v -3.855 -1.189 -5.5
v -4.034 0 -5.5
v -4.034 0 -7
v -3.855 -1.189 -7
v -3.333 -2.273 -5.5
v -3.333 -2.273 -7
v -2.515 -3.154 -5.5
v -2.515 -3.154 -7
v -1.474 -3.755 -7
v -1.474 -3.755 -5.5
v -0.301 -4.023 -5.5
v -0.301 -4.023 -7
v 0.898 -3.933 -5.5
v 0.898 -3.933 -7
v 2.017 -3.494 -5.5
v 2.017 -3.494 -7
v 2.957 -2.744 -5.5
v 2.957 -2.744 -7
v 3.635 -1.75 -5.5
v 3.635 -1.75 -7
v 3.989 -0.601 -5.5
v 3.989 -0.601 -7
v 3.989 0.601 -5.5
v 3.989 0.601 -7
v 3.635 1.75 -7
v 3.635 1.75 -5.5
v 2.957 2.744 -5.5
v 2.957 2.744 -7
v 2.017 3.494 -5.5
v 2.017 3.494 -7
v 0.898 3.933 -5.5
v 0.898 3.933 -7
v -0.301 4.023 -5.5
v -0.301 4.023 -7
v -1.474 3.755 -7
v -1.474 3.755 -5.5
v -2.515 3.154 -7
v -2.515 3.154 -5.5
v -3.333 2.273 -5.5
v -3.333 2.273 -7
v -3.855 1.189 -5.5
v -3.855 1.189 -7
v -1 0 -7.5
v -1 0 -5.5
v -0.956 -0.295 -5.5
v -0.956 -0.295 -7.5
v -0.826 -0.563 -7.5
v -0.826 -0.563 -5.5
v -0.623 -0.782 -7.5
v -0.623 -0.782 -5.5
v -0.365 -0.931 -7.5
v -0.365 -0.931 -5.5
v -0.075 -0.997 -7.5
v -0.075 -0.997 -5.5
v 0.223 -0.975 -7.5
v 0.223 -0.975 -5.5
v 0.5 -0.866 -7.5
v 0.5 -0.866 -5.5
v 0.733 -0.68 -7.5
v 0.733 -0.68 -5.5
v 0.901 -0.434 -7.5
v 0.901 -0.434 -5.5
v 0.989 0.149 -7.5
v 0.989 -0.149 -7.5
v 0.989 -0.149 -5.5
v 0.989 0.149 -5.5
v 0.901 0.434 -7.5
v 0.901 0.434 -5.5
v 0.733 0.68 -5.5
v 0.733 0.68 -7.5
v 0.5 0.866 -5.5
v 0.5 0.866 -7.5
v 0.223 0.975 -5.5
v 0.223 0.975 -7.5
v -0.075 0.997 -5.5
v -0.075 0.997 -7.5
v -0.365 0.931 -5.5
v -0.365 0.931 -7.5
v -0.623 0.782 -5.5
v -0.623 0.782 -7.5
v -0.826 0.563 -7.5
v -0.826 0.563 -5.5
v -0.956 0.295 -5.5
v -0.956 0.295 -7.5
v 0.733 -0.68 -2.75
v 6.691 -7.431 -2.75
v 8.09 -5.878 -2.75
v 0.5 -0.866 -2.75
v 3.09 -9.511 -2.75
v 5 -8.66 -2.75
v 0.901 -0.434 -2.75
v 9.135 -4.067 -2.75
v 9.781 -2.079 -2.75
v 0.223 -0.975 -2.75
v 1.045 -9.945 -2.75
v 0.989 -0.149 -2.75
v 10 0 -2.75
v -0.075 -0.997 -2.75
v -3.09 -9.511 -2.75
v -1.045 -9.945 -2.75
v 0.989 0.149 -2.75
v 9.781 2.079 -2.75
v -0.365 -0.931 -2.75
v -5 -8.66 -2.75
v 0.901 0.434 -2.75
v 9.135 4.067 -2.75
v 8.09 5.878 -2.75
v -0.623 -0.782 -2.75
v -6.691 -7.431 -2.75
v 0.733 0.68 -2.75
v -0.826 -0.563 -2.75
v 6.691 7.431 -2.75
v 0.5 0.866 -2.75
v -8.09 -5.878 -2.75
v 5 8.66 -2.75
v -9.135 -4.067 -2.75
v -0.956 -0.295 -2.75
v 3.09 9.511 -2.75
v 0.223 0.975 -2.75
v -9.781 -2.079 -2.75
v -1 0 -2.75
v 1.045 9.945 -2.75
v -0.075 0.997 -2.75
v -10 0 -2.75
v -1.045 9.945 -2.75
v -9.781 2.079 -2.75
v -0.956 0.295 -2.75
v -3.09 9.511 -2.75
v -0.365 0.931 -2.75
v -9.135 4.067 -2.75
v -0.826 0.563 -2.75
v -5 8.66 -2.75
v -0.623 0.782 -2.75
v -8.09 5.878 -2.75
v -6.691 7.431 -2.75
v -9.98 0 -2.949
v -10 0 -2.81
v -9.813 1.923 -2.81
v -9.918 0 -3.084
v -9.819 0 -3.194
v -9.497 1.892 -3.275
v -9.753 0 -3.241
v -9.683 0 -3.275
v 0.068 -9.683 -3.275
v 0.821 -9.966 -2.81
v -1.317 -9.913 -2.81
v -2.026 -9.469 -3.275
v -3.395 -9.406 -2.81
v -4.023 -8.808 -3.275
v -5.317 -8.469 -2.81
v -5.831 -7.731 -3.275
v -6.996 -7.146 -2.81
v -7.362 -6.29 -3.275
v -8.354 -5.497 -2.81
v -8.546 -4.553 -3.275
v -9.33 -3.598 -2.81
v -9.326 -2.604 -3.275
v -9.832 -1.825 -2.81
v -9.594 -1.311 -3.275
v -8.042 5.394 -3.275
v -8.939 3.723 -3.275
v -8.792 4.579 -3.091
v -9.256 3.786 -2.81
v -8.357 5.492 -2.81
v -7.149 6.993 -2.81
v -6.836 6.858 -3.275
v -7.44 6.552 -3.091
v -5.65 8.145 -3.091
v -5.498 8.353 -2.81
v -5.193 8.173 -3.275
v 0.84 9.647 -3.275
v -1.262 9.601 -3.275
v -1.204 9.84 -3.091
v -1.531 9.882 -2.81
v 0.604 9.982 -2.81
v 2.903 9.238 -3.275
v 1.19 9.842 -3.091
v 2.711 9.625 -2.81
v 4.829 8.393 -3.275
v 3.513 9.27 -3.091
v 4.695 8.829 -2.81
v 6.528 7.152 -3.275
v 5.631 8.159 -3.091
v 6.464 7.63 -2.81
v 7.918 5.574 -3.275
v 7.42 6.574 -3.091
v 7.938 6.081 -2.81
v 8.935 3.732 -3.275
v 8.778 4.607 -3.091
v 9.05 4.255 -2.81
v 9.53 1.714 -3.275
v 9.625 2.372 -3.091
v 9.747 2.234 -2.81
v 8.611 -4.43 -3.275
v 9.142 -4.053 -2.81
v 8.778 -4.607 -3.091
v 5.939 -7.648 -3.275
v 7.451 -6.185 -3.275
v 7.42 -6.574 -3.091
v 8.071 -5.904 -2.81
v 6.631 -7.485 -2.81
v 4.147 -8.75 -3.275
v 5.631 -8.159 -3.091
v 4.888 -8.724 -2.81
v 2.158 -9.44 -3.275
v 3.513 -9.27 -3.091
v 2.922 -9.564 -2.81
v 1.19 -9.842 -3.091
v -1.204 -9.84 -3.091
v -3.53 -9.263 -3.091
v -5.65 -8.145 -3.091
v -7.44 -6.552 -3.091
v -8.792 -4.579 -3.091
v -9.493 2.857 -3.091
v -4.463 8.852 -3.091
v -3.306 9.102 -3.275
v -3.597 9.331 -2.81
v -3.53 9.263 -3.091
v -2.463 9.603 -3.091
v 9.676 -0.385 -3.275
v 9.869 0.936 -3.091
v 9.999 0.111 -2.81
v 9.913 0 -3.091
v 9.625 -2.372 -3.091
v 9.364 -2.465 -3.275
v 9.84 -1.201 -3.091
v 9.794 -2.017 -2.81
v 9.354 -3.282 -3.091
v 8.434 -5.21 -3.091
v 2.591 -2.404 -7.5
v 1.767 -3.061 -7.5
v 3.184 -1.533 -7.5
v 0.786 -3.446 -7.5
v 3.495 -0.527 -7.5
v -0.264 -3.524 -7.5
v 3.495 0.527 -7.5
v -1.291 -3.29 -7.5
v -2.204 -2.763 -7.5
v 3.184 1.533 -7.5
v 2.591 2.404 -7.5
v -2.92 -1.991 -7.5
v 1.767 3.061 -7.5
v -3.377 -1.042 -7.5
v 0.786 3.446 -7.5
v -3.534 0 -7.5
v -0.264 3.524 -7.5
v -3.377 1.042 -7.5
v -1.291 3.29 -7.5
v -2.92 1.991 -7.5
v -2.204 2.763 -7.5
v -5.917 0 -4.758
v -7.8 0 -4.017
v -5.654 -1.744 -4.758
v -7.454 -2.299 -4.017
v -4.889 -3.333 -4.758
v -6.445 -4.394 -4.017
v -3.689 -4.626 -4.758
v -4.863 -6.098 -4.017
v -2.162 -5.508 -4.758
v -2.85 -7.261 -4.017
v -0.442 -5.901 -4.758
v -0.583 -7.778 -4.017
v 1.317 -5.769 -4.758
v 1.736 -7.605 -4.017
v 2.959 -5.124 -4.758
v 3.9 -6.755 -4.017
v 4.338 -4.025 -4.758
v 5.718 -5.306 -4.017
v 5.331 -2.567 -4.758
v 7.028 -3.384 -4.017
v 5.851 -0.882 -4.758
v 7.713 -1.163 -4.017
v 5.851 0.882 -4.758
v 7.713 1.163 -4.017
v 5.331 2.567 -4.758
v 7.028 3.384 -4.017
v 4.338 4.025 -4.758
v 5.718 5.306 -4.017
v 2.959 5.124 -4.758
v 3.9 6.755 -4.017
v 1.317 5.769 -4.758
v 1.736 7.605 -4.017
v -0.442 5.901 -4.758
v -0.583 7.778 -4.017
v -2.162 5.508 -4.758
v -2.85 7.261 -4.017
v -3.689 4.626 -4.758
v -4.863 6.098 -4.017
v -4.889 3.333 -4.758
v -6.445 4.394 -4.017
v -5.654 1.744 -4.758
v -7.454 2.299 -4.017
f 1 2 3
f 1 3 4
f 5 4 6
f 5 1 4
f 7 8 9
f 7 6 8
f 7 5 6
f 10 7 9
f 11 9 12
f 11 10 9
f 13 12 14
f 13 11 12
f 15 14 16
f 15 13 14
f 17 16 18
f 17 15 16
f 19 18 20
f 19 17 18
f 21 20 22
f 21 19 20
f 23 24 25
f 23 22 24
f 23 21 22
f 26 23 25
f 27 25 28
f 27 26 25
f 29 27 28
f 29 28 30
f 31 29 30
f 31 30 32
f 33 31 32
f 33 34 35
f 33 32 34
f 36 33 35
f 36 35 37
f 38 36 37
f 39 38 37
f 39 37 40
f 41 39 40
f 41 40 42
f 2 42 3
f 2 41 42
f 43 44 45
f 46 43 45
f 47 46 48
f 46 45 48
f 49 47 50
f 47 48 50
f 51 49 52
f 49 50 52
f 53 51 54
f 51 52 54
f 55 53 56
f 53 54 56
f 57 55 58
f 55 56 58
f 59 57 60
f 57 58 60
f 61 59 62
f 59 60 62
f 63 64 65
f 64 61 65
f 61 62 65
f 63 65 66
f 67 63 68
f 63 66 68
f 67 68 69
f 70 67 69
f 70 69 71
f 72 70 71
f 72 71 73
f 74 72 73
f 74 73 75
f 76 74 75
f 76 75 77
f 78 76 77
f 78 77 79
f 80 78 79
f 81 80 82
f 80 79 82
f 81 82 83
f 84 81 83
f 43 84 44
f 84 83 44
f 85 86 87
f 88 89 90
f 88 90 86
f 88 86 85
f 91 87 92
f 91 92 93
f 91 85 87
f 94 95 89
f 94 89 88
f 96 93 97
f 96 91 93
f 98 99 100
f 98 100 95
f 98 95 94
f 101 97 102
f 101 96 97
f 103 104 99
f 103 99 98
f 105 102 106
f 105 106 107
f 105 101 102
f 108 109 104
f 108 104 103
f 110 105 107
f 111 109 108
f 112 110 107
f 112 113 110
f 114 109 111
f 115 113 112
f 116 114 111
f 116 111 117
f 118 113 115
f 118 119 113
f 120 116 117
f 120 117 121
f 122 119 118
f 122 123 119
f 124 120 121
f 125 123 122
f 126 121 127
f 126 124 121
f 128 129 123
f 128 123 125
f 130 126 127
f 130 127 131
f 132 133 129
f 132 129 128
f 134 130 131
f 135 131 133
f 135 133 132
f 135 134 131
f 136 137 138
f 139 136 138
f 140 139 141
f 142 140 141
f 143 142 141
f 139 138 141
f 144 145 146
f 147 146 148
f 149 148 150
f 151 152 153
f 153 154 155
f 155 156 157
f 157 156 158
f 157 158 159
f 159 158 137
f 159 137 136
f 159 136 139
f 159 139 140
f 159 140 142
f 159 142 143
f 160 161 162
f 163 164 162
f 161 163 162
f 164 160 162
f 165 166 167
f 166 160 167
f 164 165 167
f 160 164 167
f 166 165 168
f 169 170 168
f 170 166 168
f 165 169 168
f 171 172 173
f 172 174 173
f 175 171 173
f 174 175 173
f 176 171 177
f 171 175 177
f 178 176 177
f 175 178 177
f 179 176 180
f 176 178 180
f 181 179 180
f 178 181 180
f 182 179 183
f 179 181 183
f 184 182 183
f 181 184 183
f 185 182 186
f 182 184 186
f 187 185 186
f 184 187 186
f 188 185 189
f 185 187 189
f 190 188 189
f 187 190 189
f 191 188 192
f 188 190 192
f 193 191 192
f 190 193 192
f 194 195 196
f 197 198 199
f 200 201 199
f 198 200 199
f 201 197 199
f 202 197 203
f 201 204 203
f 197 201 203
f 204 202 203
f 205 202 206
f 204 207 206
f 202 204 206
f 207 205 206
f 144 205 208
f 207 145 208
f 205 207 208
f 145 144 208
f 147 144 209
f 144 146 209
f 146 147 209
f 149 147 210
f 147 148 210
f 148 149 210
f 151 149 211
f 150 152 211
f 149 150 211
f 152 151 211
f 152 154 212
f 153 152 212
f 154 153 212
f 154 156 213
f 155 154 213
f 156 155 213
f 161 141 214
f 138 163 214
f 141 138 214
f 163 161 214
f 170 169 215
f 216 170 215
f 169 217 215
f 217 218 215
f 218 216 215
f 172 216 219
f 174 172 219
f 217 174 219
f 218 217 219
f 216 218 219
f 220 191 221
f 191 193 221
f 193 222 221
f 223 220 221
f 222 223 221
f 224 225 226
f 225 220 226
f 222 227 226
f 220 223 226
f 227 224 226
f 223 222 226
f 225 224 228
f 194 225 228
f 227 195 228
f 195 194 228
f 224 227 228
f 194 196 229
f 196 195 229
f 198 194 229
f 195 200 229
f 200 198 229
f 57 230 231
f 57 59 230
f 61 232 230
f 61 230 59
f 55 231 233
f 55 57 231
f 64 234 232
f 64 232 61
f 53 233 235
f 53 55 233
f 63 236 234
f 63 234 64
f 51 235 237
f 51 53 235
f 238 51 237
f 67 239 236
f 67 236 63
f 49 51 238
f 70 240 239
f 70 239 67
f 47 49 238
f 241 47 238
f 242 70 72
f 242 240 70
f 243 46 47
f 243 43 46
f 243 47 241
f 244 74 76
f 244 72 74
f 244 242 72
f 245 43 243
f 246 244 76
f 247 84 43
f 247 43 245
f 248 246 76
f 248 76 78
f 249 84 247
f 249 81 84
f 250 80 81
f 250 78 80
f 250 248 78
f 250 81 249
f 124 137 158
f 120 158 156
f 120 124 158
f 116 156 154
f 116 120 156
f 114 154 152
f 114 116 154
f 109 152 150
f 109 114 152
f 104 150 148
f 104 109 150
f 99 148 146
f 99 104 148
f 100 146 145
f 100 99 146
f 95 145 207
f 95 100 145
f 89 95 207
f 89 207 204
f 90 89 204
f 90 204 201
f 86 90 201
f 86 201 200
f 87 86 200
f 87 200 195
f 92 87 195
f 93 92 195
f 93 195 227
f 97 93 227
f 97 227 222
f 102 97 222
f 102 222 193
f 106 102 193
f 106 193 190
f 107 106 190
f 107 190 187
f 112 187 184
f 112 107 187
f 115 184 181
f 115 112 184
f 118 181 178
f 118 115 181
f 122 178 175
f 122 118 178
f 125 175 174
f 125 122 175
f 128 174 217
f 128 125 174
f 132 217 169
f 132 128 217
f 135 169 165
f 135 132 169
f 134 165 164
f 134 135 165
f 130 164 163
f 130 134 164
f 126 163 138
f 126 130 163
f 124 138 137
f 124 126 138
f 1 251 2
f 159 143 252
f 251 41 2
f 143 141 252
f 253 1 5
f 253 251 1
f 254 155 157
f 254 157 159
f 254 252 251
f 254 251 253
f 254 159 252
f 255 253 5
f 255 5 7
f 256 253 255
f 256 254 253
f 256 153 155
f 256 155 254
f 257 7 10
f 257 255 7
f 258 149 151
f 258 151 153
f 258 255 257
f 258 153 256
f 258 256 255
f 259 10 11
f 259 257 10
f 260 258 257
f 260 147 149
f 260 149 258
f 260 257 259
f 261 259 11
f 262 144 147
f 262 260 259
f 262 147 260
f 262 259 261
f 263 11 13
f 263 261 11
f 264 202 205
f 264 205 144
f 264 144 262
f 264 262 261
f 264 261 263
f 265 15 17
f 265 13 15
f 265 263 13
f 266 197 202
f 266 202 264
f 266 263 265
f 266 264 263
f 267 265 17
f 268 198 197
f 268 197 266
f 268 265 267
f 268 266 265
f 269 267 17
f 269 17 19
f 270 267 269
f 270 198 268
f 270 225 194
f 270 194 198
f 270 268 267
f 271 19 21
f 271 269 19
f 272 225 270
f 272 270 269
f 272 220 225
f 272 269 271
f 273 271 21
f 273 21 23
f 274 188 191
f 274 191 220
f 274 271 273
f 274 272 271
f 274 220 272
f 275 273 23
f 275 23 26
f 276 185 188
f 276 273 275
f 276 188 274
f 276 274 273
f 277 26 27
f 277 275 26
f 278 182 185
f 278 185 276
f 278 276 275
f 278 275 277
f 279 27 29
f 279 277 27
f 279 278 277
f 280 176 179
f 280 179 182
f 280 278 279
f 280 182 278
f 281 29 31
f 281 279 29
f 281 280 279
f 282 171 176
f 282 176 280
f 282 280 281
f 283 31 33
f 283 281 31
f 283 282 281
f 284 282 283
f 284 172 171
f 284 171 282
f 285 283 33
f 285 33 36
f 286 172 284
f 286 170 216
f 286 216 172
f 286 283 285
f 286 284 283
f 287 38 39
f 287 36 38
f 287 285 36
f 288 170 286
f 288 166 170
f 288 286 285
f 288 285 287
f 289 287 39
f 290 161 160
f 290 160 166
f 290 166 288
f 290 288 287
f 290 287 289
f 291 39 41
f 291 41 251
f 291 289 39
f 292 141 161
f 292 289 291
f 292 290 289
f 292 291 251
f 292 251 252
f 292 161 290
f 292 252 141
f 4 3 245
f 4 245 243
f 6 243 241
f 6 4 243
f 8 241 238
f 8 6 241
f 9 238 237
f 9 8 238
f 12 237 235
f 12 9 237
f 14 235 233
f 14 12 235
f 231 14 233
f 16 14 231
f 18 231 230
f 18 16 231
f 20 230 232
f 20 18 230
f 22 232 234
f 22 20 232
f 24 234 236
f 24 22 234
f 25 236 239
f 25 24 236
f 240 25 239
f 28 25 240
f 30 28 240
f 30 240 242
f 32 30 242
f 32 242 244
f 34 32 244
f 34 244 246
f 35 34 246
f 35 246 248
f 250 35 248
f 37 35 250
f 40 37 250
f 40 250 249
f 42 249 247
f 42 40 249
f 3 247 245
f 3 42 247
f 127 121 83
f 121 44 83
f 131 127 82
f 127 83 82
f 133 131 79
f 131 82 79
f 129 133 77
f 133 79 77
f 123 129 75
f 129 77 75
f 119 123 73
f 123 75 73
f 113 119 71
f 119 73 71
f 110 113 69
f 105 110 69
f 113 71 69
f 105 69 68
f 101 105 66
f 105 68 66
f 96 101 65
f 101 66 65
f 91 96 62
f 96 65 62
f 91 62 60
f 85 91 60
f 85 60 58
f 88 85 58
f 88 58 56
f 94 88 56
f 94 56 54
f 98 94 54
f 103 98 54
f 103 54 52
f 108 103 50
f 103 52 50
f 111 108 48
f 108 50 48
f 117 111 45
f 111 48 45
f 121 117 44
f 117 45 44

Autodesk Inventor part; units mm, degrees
ref_plane "YZ Plane" through (0, 0, 0) normal (1, 0, 0) x (0, 1, 0)
ref_plane "XZ Plane" through (0, 0, 0) normal (0, 1, 0) x (-1, 0, 0)
sketch "Sketch1" plane through (0, 0, 0) normal (0, 1, 0) x (-1, 0, 0)
  line L0 (0, 0) -> (0, -5.5)
  line L1 (0, -5.5) -> (4.0342, -5.5)
  line L2 (4.0342, -5.5) -> (10, -3.15)
  line L3 (10, -3.15) -> (10, -2.35)
  line L4 (10, -2.35) -> (4.0342, 0)
  line L5 (4.0342, 0) -> (0, 0)
  point P0 (10, -2.75)
  dimension "d0" = 43
  dimension "d2" = 0.8
  dimension "d3" = 10
  dimension "d4" = 5.5
revolve "Revolution1" add sketch "Sketch1" angle 360 about axis through (0, 0, 0) along (0, 0, -1)
sketch "Sketch2" plane through (0, 0, -5.5) normal (0, 0, -1) x (-1, 0, 0)
  circle A0 centre (0, 0) radius 4.0342 projected
  circle A1 centre (0, 0) radius 1
  dimension "d6" = 2
extrude "Extrusion1" cut sketch "Sketch2" against normal through all contours A1
ref_plane "Work Plane1" through (0, 0, -2.75) normal (0, 0, -1) x (-1, 0, 0)
fillet "Fillet1" radius 0.5 2 edges at (10, 0, -2.35) (10, 0, -3.15)
split "Split1" plane through (0, 0, -2.75) removes the side toward (0, 0, 1)
sketch "Sketch3" plane through (0, 0, -5.5) normal (0, 0, -1) x (-1, 0, 0)
  circle A0 centre (0, 0) radius 1 projected
  circle A1 centre (0, 0) radius 4.0342 projected
extrude "Extrusion2" add sketch "Sketch3" along normal blind 2
chamfer "Chamfer1" distance 0.5 angle 45 1 edges at (4.0342, 0, -7.5)
properties part number "pritlacne_kolecko_polovina"
